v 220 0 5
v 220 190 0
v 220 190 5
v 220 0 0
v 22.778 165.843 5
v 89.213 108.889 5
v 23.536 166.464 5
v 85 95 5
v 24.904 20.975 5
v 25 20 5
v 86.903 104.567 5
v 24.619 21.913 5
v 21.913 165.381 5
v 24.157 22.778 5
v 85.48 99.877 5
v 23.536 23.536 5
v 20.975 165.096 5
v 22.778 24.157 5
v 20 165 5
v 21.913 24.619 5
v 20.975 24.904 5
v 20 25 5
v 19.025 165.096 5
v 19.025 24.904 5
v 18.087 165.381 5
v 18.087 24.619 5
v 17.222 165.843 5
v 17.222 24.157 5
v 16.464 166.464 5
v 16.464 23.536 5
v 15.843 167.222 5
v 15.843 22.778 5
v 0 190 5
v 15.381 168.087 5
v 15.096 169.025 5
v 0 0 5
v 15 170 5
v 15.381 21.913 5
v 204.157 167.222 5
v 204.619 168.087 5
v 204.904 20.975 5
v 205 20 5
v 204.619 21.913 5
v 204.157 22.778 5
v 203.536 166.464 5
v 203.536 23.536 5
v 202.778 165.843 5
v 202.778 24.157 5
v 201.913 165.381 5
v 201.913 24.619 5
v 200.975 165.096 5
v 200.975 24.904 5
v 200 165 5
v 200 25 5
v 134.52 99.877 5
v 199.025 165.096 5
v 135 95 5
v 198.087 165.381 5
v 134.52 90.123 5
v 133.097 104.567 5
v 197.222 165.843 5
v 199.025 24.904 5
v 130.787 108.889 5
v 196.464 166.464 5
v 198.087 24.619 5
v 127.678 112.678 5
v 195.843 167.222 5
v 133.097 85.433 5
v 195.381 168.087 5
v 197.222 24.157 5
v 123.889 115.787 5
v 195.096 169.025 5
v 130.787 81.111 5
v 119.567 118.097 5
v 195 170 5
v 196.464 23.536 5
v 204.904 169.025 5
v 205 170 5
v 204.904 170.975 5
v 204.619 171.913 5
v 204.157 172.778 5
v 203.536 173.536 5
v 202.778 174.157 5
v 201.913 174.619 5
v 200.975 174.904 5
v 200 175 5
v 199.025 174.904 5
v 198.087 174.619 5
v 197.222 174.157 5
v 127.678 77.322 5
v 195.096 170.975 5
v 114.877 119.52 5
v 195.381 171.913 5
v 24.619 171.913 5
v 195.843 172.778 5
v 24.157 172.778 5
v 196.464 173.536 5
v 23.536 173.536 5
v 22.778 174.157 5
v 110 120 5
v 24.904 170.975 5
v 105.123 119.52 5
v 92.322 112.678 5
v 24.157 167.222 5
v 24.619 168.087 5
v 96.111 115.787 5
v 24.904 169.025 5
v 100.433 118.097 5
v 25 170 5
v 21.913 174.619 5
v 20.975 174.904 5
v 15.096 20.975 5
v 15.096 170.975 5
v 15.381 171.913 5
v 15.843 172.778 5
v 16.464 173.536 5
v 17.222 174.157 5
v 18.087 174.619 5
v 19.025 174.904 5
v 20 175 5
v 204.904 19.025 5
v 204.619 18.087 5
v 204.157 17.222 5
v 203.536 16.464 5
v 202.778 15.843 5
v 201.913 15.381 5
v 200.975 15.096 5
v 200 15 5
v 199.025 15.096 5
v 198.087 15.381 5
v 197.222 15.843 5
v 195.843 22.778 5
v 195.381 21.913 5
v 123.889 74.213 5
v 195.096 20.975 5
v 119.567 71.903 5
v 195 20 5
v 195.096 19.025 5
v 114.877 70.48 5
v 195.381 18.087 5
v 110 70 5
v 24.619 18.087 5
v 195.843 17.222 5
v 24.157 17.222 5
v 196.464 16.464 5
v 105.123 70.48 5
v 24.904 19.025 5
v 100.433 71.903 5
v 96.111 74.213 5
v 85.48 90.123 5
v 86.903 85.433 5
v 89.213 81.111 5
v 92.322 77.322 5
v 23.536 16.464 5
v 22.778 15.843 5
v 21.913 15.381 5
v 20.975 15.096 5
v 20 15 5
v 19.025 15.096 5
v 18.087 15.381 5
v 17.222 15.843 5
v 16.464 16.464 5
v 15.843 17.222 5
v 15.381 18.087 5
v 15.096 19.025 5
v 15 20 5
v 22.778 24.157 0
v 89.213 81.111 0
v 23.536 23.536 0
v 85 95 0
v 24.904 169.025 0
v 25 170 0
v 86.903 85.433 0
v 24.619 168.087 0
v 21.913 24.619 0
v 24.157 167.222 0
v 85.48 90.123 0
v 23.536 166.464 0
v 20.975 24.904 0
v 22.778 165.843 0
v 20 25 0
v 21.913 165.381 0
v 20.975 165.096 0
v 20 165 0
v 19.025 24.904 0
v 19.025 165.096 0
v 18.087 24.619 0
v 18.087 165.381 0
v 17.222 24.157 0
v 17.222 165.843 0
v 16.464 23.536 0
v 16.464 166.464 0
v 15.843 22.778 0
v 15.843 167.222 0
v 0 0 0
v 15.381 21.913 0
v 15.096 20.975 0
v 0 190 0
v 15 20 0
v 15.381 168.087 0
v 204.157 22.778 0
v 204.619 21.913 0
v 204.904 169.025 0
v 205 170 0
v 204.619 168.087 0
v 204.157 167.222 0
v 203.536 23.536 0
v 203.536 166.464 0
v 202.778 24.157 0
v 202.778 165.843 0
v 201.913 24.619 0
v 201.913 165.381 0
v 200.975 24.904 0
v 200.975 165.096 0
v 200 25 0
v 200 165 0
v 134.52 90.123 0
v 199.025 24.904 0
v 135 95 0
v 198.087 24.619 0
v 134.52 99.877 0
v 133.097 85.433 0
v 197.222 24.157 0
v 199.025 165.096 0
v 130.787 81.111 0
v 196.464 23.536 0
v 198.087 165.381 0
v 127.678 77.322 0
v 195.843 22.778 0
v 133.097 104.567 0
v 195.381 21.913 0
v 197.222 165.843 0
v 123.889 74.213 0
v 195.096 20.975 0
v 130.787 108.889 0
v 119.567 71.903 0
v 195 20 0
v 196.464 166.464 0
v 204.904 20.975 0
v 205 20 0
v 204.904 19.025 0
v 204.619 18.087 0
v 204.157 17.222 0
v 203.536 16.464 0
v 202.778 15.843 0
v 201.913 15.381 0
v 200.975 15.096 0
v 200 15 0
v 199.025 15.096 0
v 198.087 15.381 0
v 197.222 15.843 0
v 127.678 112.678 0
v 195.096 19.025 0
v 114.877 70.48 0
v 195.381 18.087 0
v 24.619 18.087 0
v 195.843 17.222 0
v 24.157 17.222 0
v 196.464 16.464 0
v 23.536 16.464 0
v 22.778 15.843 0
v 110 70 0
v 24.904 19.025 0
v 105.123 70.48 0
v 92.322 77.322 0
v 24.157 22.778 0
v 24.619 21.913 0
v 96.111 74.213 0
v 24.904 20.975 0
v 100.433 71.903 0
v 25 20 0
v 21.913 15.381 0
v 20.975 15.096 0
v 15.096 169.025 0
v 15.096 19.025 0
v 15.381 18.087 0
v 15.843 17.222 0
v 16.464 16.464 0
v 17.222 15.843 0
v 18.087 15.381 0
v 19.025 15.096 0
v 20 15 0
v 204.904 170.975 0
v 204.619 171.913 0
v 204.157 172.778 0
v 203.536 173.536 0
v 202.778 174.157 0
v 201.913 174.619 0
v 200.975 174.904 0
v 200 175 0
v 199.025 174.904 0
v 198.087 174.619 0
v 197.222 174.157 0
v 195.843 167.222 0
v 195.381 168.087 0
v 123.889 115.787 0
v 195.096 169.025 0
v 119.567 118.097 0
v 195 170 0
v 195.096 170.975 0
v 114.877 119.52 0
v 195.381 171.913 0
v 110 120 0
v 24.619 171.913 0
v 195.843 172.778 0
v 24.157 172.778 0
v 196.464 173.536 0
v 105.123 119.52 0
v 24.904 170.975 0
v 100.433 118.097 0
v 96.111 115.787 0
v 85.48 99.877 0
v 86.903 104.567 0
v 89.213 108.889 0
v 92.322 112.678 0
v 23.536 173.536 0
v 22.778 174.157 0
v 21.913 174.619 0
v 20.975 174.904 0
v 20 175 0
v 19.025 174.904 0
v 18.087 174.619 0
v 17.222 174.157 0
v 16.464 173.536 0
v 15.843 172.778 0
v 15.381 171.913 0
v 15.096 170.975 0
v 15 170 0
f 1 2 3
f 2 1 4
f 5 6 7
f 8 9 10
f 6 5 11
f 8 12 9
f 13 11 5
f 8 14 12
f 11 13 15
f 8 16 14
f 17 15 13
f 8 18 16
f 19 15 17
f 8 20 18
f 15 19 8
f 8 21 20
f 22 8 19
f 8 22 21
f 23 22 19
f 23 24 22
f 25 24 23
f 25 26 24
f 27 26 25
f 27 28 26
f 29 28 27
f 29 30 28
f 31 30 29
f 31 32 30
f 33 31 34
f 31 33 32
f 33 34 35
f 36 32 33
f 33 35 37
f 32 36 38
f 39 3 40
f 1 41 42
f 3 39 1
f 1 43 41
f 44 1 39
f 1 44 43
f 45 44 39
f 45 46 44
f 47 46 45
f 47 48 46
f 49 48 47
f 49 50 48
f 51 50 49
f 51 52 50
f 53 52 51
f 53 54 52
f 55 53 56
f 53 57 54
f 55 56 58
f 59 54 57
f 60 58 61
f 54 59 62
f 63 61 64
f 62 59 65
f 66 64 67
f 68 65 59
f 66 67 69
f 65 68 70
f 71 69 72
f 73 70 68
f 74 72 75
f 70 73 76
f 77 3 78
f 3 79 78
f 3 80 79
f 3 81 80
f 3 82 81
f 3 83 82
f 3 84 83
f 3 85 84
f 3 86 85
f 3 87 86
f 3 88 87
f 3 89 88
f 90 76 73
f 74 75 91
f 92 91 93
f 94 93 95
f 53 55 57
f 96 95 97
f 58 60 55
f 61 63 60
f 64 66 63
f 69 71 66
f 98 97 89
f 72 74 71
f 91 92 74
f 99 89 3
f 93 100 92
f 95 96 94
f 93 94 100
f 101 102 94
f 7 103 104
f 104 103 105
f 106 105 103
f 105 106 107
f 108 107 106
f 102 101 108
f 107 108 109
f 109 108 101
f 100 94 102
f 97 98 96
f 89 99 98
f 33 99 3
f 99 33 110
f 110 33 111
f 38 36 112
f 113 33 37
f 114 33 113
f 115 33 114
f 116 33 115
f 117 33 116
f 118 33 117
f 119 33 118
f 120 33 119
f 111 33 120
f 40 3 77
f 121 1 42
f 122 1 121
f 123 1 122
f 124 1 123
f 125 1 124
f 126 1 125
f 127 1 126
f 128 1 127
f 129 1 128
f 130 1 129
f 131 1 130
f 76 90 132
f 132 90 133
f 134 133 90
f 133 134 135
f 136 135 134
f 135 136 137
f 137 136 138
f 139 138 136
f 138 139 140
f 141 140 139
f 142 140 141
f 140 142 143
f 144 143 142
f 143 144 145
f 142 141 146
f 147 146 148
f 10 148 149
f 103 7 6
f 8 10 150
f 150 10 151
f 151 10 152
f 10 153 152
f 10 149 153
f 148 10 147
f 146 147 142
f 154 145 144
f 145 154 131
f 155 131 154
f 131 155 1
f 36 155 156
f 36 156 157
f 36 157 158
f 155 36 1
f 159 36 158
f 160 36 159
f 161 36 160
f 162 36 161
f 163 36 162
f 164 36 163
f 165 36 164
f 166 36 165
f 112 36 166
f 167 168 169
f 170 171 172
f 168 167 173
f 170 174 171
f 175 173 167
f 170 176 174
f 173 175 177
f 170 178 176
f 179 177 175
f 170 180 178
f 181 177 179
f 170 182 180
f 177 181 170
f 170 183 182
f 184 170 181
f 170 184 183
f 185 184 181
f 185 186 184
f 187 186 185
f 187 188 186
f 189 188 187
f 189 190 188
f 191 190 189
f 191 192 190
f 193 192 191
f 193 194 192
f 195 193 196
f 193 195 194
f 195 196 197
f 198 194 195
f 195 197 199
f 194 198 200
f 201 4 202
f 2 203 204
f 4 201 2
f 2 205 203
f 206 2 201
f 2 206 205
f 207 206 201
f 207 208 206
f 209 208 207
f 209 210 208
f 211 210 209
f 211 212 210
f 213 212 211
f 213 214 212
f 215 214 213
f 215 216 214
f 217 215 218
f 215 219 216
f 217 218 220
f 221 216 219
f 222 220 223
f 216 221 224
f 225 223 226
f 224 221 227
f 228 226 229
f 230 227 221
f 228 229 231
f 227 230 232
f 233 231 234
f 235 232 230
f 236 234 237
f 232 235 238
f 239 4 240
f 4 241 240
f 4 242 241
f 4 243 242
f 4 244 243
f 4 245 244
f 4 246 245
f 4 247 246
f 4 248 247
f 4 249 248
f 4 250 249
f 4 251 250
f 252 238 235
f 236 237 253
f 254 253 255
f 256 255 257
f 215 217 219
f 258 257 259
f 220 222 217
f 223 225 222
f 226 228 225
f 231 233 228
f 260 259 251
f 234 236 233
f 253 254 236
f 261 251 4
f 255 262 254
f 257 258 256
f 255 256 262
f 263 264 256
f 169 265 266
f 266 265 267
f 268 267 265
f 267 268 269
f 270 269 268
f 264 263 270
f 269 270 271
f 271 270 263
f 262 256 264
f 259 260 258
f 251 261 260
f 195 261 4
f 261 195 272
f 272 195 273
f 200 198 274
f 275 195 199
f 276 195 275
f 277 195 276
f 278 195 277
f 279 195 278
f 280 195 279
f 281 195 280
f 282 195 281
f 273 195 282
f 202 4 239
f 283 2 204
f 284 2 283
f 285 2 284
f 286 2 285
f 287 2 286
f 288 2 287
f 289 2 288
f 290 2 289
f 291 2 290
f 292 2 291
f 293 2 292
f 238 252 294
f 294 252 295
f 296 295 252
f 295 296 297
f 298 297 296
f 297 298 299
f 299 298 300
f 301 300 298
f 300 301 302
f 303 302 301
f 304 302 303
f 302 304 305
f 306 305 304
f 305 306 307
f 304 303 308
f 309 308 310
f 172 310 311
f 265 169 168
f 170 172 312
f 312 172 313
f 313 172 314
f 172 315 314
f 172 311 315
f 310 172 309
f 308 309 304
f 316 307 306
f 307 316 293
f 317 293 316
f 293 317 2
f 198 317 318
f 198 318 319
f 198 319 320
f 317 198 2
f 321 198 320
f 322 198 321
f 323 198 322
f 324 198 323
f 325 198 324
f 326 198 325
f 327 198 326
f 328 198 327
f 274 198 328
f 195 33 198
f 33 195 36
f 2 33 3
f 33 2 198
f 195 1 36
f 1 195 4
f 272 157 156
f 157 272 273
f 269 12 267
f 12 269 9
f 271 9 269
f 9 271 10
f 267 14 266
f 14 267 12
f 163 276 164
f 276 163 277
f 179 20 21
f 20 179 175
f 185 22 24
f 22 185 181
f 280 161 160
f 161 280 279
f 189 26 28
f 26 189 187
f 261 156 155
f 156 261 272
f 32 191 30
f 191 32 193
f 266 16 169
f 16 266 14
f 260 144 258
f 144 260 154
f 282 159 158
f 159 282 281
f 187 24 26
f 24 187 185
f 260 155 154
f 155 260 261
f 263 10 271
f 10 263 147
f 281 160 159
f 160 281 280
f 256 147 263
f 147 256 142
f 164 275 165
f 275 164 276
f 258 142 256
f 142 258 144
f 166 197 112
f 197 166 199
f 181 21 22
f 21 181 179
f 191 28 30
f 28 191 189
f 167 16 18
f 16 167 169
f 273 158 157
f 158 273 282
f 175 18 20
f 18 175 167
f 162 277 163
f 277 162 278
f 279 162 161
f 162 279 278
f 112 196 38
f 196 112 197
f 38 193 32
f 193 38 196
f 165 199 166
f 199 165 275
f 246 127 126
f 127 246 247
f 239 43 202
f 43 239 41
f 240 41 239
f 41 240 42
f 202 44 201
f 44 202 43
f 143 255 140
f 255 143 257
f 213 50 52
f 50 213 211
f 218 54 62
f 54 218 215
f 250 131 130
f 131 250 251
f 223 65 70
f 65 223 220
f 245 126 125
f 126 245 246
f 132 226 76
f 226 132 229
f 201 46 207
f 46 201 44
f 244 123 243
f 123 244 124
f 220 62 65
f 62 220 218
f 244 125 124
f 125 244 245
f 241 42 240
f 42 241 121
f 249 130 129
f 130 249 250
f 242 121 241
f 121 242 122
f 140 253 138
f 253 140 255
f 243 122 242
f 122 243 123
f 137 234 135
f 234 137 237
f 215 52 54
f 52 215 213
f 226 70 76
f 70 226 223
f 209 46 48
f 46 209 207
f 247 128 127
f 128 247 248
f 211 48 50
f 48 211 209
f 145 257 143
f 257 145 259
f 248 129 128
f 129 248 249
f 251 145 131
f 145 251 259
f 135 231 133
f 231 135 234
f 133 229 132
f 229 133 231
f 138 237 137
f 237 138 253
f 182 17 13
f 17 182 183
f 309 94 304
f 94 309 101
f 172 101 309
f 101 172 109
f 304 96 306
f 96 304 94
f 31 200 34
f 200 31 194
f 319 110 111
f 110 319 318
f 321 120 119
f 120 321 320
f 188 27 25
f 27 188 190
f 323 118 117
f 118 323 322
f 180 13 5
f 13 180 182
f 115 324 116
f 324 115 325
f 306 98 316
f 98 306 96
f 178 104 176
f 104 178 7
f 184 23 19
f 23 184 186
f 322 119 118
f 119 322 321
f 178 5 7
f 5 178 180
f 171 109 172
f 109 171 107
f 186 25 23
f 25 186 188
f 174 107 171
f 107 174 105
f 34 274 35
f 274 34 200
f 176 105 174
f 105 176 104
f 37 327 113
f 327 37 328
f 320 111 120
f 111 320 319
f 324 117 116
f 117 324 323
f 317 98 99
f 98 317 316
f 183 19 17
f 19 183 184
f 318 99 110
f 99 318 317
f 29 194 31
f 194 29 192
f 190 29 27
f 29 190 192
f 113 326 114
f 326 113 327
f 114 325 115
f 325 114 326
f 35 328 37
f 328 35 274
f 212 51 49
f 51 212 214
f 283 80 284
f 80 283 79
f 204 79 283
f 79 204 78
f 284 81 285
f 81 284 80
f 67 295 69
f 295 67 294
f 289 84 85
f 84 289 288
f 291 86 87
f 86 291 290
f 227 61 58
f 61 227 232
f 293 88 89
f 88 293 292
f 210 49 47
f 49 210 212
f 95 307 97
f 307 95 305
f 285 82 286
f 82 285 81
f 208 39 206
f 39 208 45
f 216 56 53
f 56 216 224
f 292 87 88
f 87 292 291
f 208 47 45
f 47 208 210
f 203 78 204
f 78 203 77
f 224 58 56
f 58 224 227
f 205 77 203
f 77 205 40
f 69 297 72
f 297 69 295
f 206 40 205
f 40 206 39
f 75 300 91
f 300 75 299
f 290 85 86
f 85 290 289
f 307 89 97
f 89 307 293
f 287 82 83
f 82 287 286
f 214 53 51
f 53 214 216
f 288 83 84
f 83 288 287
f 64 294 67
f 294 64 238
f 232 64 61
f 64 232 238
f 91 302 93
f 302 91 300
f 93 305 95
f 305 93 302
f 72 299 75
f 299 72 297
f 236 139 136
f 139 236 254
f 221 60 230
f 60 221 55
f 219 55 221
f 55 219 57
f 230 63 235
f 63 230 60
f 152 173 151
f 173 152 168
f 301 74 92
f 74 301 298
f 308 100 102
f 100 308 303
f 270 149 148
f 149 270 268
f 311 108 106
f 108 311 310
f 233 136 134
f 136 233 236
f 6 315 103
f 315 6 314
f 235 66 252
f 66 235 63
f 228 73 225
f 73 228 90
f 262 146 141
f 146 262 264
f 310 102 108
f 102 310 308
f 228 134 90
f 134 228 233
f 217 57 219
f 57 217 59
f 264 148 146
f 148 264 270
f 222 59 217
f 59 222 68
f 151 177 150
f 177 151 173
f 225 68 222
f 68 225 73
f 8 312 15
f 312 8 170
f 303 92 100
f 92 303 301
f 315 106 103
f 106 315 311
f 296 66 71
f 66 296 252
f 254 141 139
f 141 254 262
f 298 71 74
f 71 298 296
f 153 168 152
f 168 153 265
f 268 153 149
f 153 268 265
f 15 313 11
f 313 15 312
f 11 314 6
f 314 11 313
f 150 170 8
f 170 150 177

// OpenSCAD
$fn = 32;

// ----------------------------------------------------------------------
// Big plate: 200-250 mm adapter plate
// ----------------------------------------------------------------------

// --- parameters (mm) ---
plate_l = 220;            // plate length, X
plate_w = 190;            // plate width, Y
plate_t = 5;              // plate thickness, Z
corner_d = 10;            // corner hole diameter
corner_in = 20;           // corner hole inset from the edges
bore_d = 50;              // central bore

difference() {
  cube([plate_l, plate_w, plate_t]);
  translate([corner_in, corner_in, -1]) cylinder(h = plate_t + 2, d = corner_d);
  translate([plate_l - corner_in, corner_in, -1]) cylinder(h = plate_t + 2, d = corner_d);
  translate([corner_in, plate_w - corner_in, -1]) cylinder(h = plate_t + 2, d = corner_d);
  translate([plate_l - corner_in, plate_w - corner_in, -1]) cylinder(h = plate_t + 2, d = corner_d);
  translate([plate_l / 2, plate_w / 2, -1]) cylinder(h = plate_t + 2, d = bore_d);
}
